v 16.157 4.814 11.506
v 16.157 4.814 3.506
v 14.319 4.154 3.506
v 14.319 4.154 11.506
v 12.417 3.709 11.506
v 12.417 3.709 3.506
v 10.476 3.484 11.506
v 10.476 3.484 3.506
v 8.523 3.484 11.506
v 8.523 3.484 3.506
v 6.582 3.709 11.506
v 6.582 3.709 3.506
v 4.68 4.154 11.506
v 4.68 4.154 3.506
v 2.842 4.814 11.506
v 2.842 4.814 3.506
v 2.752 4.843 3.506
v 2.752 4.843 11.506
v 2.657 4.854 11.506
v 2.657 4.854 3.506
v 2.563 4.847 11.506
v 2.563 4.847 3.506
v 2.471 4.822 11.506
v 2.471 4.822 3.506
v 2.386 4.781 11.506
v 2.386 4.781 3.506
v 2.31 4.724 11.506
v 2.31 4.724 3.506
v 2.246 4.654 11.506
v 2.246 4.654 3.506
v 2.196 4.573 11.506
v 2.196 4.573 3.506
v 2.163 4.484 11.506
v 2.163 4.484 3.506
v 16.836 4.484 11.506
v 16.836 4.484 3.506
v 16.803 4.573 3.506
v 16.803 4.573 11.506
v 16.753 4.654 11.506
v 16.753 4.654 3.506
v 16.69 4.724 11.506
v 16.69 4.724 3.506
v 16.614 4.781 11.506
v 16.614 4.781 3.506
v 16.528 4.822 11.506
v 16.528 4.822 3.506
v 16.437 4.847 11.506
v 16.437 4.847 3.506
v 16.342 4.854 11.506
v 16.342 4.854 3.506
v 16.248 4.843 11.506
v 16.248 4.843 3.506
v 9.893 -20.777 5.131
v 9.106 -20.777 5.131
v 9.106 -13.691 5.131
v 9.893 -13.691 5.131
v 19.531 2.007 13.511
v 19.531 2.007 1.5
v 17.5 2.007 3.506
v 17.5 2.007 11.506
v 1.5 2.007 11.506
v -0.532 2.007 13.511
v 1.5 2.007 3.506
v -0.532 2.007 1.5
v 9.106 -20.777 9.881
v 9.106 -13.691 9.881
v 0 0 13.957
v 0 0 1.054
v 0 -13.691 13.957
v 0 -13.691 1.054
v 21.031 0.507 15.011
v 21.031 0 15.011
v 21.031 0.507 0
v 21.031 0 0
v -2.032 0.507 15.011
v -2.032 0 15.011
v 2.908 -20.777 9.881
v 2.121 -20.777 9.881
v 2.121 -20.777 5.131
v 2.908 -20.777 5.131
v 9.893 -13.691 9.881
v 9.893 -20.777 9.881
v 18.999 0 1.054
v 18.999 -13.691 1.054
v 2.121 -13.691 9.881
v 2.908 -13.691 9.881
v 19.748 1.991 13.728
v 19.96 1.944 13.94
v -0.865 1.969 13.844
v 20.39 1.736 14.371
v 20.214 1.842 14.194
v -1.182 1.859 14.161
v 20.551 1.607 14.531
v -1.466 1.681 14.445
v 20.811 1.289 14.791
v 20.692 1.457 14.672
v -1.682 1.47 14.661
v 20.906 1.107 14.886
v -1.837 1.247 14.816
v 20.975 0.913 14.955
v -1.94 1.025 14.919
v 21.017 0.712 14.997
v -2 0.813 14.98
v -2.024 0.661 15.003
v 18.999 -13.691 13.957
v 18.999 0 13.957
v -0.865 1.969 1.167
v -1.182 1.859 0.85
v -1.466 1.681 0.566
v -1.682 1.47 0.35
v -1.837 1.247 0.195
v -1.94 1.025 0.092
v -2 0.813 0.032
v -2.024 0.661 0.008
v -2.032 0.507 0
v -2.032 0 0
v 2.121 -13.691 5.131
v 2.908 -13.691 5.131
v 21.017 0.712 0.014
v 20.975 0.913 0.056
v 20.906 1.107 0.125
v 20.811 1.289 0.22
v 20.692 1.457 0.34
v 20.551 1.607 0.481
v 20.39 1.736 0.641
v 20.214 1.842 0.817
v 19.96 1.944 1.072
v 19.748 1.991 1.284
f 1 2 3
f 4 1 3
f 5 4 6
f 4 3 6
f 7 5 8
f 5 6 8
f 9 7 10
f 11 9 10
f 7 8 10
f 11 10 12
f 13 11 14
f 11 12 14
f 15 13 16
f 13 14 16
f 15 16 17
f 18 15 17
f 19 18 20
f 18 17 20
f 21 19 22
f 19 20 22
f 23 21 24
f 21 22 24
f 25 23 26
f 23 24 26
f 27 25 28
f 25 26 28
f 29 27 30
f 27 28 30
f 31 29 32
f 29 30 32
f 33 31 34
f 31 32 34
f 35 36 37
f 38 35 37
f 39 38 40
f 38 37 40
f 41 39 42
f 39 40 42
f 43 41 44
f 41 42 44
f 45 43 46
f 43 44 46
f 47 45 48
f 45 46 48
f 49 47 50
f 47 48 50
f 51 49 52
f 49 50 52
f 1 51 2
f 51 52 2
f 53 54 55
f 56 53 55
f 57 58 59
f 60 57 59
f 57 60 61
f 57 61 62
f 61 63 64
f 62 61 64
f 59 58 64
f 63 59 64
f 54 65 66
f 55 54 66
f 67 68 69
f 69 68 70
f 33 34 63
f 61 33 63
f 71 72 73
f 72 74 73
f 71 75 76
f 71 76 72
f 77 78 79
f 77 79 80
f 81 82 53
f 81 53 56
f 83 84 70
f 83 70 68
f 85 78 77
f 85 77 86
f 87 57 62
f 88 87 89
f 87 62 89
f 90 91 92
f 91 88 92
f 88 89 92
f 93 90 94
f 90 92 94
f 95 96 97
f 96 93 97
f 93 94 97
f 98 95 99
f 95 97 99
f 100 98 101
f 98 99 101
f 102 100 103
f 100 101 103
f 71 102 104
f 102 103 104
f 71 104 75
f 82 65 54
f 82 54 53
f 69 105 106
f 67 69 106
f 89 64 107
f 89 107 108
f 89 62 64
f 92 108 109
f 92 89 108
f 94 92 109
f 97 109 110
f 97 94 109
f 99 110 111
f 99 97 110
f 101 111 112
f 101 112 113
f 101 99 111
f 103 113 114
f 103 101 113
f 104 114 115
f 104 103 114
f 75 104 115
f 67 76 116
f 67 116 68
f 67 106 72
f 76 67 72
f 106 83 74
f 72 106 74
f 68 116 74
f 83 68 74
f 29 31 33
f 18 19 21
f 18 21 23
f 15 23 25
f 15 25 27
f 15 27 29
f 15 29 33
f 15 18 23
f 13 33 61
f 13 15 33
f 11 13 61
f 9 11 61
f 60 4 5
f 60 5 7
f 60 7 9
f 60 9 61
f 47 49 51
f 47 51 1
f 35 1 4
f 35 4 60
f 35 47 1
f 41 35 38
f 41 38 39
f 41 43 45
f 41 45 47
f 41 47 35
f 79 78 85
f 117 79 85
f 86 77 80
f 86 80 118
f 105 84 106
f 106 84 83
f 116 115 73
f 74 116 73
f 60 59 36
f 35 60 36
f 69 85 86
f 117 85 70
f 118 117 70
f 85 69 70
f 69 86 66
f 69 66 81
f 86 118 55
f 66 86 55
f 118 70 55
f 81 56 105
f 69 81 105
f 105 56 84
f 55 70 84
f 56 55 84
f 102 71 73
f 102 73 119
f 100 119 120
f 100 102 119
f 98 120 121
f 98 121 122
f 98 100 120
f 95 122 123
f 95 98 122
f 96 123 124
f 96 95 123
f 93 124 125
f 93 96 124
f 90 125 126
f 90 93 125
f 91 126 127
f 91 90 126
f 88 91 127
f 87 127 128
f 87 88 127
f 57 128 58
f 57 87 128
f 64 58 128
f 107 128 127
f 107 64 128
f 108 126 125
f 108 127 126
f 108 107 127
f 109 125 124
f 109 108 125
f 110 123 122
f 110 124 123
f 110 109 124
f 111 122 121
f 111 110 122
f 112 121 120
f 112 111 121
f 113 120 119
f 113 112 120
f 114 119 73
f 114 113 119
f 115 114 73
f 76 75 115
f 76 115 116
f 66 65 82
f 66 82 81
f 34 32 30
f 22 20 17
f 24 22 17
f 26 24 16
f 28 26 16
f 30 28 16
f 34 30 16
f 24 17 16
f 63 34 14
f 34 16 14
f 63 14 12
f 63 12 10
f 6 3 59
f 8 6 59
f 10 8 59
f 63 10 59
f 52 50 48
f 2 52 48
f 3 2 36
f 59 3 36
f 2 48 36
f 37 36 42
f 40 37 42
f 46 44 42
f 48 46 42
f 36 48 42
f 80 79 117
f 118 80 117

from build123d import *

# Parameters (mm, degrees)
BOSS_EXTRUDE1_DEPTH      = 15.0114
SKETCH2_W                = 1.0541
SKETCH2_H                = 13.6906
CUT_EXTRUDE1_DEPTH       = 31.735742265
FILLET1_R                = 1.5
SKETCH4_W                = 0.7874
SKETCH4_H                = 7.0866
BOSS_EXTRUDE2_DEPTH      = 12.9032
SKETCH5_W                = 4.0767
SKETCH5_H                = 7.0866
CUT_EXTRUDE2_DEPTH       = 34.156380129
BOSS_EXTRUDE3_DEPTH      = 4
BOSS_EXTRUDE3_DEPTH_BACK = 4


with BuildPart() as part:
    # Sketch1 → Boss-Extrude1 (new body)
    with BuildSketch(Plane.XY):
        Polygon((-2.032, 0), (0, 0), (0, -13.6906), (18.9992, -13.6906), (18.9992, 0), (21.0312, 0), (21.0312, 2.0066), (-2.032, 2.0066), align=None)
    extrude(amount=BOSS_EXTRUDE1_DEPTH)

    # Sketch2 → Cut-Extrude1 (cut, through all)
    with BuildSketch(Plane(origin=(21.0312, 0, 0), x_dir=(0, 0, -1), z_dir=(1, 0, 0))):
        with Locations((-14.48435, -6.8453)):
            Rectangle(SKETCH2_W, SKETCH2_H)
        with Locations((-0.52705, -6.8453)):
            Rectangle(SKETCH2_W, SKETCH2_H)
    extrude(amount=-CUT_EXTRUDE1_DEPTH, mode=Mode.SUBTRACT)

    # Fillet1
    fillet1_edges = [part.edges().sort_by_distance(p)[0] for p in [
        (-2.032, 2.0066, 7.5057),
        (21.0312, 2.0066, 7.5057),
        (9.4996, 2.0066, 15.0114),
        (9.4996, 2.0066, 0),
    ]]
    fillet(fillet1_edges, radius=FILLET1_R)

    # Sketch4 → Boss-Extrude2 (add)
    with BuildSketch(Plane.XY.offset(13.9573)):
        with Locations((2.5146, -17.2339)):
            Rectangle(SKETCH4_W, SKETCH4_H)
        with Locations((9.4996, -17.2339)):
            Rectangle(SKETCH4_W, SKETCH4_H)
    extrude(amount=-BOSS_EXTRUDE2_DEPTH)

    # Sketch5 → Cut-Extrude2 (cut, through all)
    with BuildSketch(Plane.ZY):
        with Locations((3.09245, -17.2339)):
            Rectangle(SKETCH5_W, SKETCH5_H)
        with Locations((11.91895, -17.2339)):
            Rectangle(SKETCH5_W, SKETCH5_H)
    extrude(amount=-CUT_EXTRUDE2_DEPTH, mode=Mode.SUBTRACT)

    # Sketch6 → Boss-Extrude3 (add, two sides: drawn at the far end of the back side and taken through both)
    with BuildSketch(Plane.XY.offset(7.5057).offset(-BOSS_EXTRUDE3_DEPTH_BACK)):
        with BuildLine():
            Line((2.163304729, 4.48357977), (1.4996, 2.0066))
            Line((1.4996, 2.0066), (17.4996, 2.0066))
            Line((17.4996, 2.0066), (16.835895271, 4.48357977))
            ThreePointArc((16.835895271, 4.48357977), (16.571901131, 4.803672947), (16.157122862, 4.814233984))
            ThreePointArc((16.157122862, 4.814233984), (9.4996, 3.456401012), (2.842077138, 4.814233984))
            ThreePointArc((2.842077138, 4.814233984), (2.427298869, 4.803672947), (2.163304729, 4.48357977))
        make_face()
    extrude(amount=BOSS_EXTRUDE3_DEPTH + BOSS_EXTRUDE3_DEPTH_BACK)


solid = part.part
